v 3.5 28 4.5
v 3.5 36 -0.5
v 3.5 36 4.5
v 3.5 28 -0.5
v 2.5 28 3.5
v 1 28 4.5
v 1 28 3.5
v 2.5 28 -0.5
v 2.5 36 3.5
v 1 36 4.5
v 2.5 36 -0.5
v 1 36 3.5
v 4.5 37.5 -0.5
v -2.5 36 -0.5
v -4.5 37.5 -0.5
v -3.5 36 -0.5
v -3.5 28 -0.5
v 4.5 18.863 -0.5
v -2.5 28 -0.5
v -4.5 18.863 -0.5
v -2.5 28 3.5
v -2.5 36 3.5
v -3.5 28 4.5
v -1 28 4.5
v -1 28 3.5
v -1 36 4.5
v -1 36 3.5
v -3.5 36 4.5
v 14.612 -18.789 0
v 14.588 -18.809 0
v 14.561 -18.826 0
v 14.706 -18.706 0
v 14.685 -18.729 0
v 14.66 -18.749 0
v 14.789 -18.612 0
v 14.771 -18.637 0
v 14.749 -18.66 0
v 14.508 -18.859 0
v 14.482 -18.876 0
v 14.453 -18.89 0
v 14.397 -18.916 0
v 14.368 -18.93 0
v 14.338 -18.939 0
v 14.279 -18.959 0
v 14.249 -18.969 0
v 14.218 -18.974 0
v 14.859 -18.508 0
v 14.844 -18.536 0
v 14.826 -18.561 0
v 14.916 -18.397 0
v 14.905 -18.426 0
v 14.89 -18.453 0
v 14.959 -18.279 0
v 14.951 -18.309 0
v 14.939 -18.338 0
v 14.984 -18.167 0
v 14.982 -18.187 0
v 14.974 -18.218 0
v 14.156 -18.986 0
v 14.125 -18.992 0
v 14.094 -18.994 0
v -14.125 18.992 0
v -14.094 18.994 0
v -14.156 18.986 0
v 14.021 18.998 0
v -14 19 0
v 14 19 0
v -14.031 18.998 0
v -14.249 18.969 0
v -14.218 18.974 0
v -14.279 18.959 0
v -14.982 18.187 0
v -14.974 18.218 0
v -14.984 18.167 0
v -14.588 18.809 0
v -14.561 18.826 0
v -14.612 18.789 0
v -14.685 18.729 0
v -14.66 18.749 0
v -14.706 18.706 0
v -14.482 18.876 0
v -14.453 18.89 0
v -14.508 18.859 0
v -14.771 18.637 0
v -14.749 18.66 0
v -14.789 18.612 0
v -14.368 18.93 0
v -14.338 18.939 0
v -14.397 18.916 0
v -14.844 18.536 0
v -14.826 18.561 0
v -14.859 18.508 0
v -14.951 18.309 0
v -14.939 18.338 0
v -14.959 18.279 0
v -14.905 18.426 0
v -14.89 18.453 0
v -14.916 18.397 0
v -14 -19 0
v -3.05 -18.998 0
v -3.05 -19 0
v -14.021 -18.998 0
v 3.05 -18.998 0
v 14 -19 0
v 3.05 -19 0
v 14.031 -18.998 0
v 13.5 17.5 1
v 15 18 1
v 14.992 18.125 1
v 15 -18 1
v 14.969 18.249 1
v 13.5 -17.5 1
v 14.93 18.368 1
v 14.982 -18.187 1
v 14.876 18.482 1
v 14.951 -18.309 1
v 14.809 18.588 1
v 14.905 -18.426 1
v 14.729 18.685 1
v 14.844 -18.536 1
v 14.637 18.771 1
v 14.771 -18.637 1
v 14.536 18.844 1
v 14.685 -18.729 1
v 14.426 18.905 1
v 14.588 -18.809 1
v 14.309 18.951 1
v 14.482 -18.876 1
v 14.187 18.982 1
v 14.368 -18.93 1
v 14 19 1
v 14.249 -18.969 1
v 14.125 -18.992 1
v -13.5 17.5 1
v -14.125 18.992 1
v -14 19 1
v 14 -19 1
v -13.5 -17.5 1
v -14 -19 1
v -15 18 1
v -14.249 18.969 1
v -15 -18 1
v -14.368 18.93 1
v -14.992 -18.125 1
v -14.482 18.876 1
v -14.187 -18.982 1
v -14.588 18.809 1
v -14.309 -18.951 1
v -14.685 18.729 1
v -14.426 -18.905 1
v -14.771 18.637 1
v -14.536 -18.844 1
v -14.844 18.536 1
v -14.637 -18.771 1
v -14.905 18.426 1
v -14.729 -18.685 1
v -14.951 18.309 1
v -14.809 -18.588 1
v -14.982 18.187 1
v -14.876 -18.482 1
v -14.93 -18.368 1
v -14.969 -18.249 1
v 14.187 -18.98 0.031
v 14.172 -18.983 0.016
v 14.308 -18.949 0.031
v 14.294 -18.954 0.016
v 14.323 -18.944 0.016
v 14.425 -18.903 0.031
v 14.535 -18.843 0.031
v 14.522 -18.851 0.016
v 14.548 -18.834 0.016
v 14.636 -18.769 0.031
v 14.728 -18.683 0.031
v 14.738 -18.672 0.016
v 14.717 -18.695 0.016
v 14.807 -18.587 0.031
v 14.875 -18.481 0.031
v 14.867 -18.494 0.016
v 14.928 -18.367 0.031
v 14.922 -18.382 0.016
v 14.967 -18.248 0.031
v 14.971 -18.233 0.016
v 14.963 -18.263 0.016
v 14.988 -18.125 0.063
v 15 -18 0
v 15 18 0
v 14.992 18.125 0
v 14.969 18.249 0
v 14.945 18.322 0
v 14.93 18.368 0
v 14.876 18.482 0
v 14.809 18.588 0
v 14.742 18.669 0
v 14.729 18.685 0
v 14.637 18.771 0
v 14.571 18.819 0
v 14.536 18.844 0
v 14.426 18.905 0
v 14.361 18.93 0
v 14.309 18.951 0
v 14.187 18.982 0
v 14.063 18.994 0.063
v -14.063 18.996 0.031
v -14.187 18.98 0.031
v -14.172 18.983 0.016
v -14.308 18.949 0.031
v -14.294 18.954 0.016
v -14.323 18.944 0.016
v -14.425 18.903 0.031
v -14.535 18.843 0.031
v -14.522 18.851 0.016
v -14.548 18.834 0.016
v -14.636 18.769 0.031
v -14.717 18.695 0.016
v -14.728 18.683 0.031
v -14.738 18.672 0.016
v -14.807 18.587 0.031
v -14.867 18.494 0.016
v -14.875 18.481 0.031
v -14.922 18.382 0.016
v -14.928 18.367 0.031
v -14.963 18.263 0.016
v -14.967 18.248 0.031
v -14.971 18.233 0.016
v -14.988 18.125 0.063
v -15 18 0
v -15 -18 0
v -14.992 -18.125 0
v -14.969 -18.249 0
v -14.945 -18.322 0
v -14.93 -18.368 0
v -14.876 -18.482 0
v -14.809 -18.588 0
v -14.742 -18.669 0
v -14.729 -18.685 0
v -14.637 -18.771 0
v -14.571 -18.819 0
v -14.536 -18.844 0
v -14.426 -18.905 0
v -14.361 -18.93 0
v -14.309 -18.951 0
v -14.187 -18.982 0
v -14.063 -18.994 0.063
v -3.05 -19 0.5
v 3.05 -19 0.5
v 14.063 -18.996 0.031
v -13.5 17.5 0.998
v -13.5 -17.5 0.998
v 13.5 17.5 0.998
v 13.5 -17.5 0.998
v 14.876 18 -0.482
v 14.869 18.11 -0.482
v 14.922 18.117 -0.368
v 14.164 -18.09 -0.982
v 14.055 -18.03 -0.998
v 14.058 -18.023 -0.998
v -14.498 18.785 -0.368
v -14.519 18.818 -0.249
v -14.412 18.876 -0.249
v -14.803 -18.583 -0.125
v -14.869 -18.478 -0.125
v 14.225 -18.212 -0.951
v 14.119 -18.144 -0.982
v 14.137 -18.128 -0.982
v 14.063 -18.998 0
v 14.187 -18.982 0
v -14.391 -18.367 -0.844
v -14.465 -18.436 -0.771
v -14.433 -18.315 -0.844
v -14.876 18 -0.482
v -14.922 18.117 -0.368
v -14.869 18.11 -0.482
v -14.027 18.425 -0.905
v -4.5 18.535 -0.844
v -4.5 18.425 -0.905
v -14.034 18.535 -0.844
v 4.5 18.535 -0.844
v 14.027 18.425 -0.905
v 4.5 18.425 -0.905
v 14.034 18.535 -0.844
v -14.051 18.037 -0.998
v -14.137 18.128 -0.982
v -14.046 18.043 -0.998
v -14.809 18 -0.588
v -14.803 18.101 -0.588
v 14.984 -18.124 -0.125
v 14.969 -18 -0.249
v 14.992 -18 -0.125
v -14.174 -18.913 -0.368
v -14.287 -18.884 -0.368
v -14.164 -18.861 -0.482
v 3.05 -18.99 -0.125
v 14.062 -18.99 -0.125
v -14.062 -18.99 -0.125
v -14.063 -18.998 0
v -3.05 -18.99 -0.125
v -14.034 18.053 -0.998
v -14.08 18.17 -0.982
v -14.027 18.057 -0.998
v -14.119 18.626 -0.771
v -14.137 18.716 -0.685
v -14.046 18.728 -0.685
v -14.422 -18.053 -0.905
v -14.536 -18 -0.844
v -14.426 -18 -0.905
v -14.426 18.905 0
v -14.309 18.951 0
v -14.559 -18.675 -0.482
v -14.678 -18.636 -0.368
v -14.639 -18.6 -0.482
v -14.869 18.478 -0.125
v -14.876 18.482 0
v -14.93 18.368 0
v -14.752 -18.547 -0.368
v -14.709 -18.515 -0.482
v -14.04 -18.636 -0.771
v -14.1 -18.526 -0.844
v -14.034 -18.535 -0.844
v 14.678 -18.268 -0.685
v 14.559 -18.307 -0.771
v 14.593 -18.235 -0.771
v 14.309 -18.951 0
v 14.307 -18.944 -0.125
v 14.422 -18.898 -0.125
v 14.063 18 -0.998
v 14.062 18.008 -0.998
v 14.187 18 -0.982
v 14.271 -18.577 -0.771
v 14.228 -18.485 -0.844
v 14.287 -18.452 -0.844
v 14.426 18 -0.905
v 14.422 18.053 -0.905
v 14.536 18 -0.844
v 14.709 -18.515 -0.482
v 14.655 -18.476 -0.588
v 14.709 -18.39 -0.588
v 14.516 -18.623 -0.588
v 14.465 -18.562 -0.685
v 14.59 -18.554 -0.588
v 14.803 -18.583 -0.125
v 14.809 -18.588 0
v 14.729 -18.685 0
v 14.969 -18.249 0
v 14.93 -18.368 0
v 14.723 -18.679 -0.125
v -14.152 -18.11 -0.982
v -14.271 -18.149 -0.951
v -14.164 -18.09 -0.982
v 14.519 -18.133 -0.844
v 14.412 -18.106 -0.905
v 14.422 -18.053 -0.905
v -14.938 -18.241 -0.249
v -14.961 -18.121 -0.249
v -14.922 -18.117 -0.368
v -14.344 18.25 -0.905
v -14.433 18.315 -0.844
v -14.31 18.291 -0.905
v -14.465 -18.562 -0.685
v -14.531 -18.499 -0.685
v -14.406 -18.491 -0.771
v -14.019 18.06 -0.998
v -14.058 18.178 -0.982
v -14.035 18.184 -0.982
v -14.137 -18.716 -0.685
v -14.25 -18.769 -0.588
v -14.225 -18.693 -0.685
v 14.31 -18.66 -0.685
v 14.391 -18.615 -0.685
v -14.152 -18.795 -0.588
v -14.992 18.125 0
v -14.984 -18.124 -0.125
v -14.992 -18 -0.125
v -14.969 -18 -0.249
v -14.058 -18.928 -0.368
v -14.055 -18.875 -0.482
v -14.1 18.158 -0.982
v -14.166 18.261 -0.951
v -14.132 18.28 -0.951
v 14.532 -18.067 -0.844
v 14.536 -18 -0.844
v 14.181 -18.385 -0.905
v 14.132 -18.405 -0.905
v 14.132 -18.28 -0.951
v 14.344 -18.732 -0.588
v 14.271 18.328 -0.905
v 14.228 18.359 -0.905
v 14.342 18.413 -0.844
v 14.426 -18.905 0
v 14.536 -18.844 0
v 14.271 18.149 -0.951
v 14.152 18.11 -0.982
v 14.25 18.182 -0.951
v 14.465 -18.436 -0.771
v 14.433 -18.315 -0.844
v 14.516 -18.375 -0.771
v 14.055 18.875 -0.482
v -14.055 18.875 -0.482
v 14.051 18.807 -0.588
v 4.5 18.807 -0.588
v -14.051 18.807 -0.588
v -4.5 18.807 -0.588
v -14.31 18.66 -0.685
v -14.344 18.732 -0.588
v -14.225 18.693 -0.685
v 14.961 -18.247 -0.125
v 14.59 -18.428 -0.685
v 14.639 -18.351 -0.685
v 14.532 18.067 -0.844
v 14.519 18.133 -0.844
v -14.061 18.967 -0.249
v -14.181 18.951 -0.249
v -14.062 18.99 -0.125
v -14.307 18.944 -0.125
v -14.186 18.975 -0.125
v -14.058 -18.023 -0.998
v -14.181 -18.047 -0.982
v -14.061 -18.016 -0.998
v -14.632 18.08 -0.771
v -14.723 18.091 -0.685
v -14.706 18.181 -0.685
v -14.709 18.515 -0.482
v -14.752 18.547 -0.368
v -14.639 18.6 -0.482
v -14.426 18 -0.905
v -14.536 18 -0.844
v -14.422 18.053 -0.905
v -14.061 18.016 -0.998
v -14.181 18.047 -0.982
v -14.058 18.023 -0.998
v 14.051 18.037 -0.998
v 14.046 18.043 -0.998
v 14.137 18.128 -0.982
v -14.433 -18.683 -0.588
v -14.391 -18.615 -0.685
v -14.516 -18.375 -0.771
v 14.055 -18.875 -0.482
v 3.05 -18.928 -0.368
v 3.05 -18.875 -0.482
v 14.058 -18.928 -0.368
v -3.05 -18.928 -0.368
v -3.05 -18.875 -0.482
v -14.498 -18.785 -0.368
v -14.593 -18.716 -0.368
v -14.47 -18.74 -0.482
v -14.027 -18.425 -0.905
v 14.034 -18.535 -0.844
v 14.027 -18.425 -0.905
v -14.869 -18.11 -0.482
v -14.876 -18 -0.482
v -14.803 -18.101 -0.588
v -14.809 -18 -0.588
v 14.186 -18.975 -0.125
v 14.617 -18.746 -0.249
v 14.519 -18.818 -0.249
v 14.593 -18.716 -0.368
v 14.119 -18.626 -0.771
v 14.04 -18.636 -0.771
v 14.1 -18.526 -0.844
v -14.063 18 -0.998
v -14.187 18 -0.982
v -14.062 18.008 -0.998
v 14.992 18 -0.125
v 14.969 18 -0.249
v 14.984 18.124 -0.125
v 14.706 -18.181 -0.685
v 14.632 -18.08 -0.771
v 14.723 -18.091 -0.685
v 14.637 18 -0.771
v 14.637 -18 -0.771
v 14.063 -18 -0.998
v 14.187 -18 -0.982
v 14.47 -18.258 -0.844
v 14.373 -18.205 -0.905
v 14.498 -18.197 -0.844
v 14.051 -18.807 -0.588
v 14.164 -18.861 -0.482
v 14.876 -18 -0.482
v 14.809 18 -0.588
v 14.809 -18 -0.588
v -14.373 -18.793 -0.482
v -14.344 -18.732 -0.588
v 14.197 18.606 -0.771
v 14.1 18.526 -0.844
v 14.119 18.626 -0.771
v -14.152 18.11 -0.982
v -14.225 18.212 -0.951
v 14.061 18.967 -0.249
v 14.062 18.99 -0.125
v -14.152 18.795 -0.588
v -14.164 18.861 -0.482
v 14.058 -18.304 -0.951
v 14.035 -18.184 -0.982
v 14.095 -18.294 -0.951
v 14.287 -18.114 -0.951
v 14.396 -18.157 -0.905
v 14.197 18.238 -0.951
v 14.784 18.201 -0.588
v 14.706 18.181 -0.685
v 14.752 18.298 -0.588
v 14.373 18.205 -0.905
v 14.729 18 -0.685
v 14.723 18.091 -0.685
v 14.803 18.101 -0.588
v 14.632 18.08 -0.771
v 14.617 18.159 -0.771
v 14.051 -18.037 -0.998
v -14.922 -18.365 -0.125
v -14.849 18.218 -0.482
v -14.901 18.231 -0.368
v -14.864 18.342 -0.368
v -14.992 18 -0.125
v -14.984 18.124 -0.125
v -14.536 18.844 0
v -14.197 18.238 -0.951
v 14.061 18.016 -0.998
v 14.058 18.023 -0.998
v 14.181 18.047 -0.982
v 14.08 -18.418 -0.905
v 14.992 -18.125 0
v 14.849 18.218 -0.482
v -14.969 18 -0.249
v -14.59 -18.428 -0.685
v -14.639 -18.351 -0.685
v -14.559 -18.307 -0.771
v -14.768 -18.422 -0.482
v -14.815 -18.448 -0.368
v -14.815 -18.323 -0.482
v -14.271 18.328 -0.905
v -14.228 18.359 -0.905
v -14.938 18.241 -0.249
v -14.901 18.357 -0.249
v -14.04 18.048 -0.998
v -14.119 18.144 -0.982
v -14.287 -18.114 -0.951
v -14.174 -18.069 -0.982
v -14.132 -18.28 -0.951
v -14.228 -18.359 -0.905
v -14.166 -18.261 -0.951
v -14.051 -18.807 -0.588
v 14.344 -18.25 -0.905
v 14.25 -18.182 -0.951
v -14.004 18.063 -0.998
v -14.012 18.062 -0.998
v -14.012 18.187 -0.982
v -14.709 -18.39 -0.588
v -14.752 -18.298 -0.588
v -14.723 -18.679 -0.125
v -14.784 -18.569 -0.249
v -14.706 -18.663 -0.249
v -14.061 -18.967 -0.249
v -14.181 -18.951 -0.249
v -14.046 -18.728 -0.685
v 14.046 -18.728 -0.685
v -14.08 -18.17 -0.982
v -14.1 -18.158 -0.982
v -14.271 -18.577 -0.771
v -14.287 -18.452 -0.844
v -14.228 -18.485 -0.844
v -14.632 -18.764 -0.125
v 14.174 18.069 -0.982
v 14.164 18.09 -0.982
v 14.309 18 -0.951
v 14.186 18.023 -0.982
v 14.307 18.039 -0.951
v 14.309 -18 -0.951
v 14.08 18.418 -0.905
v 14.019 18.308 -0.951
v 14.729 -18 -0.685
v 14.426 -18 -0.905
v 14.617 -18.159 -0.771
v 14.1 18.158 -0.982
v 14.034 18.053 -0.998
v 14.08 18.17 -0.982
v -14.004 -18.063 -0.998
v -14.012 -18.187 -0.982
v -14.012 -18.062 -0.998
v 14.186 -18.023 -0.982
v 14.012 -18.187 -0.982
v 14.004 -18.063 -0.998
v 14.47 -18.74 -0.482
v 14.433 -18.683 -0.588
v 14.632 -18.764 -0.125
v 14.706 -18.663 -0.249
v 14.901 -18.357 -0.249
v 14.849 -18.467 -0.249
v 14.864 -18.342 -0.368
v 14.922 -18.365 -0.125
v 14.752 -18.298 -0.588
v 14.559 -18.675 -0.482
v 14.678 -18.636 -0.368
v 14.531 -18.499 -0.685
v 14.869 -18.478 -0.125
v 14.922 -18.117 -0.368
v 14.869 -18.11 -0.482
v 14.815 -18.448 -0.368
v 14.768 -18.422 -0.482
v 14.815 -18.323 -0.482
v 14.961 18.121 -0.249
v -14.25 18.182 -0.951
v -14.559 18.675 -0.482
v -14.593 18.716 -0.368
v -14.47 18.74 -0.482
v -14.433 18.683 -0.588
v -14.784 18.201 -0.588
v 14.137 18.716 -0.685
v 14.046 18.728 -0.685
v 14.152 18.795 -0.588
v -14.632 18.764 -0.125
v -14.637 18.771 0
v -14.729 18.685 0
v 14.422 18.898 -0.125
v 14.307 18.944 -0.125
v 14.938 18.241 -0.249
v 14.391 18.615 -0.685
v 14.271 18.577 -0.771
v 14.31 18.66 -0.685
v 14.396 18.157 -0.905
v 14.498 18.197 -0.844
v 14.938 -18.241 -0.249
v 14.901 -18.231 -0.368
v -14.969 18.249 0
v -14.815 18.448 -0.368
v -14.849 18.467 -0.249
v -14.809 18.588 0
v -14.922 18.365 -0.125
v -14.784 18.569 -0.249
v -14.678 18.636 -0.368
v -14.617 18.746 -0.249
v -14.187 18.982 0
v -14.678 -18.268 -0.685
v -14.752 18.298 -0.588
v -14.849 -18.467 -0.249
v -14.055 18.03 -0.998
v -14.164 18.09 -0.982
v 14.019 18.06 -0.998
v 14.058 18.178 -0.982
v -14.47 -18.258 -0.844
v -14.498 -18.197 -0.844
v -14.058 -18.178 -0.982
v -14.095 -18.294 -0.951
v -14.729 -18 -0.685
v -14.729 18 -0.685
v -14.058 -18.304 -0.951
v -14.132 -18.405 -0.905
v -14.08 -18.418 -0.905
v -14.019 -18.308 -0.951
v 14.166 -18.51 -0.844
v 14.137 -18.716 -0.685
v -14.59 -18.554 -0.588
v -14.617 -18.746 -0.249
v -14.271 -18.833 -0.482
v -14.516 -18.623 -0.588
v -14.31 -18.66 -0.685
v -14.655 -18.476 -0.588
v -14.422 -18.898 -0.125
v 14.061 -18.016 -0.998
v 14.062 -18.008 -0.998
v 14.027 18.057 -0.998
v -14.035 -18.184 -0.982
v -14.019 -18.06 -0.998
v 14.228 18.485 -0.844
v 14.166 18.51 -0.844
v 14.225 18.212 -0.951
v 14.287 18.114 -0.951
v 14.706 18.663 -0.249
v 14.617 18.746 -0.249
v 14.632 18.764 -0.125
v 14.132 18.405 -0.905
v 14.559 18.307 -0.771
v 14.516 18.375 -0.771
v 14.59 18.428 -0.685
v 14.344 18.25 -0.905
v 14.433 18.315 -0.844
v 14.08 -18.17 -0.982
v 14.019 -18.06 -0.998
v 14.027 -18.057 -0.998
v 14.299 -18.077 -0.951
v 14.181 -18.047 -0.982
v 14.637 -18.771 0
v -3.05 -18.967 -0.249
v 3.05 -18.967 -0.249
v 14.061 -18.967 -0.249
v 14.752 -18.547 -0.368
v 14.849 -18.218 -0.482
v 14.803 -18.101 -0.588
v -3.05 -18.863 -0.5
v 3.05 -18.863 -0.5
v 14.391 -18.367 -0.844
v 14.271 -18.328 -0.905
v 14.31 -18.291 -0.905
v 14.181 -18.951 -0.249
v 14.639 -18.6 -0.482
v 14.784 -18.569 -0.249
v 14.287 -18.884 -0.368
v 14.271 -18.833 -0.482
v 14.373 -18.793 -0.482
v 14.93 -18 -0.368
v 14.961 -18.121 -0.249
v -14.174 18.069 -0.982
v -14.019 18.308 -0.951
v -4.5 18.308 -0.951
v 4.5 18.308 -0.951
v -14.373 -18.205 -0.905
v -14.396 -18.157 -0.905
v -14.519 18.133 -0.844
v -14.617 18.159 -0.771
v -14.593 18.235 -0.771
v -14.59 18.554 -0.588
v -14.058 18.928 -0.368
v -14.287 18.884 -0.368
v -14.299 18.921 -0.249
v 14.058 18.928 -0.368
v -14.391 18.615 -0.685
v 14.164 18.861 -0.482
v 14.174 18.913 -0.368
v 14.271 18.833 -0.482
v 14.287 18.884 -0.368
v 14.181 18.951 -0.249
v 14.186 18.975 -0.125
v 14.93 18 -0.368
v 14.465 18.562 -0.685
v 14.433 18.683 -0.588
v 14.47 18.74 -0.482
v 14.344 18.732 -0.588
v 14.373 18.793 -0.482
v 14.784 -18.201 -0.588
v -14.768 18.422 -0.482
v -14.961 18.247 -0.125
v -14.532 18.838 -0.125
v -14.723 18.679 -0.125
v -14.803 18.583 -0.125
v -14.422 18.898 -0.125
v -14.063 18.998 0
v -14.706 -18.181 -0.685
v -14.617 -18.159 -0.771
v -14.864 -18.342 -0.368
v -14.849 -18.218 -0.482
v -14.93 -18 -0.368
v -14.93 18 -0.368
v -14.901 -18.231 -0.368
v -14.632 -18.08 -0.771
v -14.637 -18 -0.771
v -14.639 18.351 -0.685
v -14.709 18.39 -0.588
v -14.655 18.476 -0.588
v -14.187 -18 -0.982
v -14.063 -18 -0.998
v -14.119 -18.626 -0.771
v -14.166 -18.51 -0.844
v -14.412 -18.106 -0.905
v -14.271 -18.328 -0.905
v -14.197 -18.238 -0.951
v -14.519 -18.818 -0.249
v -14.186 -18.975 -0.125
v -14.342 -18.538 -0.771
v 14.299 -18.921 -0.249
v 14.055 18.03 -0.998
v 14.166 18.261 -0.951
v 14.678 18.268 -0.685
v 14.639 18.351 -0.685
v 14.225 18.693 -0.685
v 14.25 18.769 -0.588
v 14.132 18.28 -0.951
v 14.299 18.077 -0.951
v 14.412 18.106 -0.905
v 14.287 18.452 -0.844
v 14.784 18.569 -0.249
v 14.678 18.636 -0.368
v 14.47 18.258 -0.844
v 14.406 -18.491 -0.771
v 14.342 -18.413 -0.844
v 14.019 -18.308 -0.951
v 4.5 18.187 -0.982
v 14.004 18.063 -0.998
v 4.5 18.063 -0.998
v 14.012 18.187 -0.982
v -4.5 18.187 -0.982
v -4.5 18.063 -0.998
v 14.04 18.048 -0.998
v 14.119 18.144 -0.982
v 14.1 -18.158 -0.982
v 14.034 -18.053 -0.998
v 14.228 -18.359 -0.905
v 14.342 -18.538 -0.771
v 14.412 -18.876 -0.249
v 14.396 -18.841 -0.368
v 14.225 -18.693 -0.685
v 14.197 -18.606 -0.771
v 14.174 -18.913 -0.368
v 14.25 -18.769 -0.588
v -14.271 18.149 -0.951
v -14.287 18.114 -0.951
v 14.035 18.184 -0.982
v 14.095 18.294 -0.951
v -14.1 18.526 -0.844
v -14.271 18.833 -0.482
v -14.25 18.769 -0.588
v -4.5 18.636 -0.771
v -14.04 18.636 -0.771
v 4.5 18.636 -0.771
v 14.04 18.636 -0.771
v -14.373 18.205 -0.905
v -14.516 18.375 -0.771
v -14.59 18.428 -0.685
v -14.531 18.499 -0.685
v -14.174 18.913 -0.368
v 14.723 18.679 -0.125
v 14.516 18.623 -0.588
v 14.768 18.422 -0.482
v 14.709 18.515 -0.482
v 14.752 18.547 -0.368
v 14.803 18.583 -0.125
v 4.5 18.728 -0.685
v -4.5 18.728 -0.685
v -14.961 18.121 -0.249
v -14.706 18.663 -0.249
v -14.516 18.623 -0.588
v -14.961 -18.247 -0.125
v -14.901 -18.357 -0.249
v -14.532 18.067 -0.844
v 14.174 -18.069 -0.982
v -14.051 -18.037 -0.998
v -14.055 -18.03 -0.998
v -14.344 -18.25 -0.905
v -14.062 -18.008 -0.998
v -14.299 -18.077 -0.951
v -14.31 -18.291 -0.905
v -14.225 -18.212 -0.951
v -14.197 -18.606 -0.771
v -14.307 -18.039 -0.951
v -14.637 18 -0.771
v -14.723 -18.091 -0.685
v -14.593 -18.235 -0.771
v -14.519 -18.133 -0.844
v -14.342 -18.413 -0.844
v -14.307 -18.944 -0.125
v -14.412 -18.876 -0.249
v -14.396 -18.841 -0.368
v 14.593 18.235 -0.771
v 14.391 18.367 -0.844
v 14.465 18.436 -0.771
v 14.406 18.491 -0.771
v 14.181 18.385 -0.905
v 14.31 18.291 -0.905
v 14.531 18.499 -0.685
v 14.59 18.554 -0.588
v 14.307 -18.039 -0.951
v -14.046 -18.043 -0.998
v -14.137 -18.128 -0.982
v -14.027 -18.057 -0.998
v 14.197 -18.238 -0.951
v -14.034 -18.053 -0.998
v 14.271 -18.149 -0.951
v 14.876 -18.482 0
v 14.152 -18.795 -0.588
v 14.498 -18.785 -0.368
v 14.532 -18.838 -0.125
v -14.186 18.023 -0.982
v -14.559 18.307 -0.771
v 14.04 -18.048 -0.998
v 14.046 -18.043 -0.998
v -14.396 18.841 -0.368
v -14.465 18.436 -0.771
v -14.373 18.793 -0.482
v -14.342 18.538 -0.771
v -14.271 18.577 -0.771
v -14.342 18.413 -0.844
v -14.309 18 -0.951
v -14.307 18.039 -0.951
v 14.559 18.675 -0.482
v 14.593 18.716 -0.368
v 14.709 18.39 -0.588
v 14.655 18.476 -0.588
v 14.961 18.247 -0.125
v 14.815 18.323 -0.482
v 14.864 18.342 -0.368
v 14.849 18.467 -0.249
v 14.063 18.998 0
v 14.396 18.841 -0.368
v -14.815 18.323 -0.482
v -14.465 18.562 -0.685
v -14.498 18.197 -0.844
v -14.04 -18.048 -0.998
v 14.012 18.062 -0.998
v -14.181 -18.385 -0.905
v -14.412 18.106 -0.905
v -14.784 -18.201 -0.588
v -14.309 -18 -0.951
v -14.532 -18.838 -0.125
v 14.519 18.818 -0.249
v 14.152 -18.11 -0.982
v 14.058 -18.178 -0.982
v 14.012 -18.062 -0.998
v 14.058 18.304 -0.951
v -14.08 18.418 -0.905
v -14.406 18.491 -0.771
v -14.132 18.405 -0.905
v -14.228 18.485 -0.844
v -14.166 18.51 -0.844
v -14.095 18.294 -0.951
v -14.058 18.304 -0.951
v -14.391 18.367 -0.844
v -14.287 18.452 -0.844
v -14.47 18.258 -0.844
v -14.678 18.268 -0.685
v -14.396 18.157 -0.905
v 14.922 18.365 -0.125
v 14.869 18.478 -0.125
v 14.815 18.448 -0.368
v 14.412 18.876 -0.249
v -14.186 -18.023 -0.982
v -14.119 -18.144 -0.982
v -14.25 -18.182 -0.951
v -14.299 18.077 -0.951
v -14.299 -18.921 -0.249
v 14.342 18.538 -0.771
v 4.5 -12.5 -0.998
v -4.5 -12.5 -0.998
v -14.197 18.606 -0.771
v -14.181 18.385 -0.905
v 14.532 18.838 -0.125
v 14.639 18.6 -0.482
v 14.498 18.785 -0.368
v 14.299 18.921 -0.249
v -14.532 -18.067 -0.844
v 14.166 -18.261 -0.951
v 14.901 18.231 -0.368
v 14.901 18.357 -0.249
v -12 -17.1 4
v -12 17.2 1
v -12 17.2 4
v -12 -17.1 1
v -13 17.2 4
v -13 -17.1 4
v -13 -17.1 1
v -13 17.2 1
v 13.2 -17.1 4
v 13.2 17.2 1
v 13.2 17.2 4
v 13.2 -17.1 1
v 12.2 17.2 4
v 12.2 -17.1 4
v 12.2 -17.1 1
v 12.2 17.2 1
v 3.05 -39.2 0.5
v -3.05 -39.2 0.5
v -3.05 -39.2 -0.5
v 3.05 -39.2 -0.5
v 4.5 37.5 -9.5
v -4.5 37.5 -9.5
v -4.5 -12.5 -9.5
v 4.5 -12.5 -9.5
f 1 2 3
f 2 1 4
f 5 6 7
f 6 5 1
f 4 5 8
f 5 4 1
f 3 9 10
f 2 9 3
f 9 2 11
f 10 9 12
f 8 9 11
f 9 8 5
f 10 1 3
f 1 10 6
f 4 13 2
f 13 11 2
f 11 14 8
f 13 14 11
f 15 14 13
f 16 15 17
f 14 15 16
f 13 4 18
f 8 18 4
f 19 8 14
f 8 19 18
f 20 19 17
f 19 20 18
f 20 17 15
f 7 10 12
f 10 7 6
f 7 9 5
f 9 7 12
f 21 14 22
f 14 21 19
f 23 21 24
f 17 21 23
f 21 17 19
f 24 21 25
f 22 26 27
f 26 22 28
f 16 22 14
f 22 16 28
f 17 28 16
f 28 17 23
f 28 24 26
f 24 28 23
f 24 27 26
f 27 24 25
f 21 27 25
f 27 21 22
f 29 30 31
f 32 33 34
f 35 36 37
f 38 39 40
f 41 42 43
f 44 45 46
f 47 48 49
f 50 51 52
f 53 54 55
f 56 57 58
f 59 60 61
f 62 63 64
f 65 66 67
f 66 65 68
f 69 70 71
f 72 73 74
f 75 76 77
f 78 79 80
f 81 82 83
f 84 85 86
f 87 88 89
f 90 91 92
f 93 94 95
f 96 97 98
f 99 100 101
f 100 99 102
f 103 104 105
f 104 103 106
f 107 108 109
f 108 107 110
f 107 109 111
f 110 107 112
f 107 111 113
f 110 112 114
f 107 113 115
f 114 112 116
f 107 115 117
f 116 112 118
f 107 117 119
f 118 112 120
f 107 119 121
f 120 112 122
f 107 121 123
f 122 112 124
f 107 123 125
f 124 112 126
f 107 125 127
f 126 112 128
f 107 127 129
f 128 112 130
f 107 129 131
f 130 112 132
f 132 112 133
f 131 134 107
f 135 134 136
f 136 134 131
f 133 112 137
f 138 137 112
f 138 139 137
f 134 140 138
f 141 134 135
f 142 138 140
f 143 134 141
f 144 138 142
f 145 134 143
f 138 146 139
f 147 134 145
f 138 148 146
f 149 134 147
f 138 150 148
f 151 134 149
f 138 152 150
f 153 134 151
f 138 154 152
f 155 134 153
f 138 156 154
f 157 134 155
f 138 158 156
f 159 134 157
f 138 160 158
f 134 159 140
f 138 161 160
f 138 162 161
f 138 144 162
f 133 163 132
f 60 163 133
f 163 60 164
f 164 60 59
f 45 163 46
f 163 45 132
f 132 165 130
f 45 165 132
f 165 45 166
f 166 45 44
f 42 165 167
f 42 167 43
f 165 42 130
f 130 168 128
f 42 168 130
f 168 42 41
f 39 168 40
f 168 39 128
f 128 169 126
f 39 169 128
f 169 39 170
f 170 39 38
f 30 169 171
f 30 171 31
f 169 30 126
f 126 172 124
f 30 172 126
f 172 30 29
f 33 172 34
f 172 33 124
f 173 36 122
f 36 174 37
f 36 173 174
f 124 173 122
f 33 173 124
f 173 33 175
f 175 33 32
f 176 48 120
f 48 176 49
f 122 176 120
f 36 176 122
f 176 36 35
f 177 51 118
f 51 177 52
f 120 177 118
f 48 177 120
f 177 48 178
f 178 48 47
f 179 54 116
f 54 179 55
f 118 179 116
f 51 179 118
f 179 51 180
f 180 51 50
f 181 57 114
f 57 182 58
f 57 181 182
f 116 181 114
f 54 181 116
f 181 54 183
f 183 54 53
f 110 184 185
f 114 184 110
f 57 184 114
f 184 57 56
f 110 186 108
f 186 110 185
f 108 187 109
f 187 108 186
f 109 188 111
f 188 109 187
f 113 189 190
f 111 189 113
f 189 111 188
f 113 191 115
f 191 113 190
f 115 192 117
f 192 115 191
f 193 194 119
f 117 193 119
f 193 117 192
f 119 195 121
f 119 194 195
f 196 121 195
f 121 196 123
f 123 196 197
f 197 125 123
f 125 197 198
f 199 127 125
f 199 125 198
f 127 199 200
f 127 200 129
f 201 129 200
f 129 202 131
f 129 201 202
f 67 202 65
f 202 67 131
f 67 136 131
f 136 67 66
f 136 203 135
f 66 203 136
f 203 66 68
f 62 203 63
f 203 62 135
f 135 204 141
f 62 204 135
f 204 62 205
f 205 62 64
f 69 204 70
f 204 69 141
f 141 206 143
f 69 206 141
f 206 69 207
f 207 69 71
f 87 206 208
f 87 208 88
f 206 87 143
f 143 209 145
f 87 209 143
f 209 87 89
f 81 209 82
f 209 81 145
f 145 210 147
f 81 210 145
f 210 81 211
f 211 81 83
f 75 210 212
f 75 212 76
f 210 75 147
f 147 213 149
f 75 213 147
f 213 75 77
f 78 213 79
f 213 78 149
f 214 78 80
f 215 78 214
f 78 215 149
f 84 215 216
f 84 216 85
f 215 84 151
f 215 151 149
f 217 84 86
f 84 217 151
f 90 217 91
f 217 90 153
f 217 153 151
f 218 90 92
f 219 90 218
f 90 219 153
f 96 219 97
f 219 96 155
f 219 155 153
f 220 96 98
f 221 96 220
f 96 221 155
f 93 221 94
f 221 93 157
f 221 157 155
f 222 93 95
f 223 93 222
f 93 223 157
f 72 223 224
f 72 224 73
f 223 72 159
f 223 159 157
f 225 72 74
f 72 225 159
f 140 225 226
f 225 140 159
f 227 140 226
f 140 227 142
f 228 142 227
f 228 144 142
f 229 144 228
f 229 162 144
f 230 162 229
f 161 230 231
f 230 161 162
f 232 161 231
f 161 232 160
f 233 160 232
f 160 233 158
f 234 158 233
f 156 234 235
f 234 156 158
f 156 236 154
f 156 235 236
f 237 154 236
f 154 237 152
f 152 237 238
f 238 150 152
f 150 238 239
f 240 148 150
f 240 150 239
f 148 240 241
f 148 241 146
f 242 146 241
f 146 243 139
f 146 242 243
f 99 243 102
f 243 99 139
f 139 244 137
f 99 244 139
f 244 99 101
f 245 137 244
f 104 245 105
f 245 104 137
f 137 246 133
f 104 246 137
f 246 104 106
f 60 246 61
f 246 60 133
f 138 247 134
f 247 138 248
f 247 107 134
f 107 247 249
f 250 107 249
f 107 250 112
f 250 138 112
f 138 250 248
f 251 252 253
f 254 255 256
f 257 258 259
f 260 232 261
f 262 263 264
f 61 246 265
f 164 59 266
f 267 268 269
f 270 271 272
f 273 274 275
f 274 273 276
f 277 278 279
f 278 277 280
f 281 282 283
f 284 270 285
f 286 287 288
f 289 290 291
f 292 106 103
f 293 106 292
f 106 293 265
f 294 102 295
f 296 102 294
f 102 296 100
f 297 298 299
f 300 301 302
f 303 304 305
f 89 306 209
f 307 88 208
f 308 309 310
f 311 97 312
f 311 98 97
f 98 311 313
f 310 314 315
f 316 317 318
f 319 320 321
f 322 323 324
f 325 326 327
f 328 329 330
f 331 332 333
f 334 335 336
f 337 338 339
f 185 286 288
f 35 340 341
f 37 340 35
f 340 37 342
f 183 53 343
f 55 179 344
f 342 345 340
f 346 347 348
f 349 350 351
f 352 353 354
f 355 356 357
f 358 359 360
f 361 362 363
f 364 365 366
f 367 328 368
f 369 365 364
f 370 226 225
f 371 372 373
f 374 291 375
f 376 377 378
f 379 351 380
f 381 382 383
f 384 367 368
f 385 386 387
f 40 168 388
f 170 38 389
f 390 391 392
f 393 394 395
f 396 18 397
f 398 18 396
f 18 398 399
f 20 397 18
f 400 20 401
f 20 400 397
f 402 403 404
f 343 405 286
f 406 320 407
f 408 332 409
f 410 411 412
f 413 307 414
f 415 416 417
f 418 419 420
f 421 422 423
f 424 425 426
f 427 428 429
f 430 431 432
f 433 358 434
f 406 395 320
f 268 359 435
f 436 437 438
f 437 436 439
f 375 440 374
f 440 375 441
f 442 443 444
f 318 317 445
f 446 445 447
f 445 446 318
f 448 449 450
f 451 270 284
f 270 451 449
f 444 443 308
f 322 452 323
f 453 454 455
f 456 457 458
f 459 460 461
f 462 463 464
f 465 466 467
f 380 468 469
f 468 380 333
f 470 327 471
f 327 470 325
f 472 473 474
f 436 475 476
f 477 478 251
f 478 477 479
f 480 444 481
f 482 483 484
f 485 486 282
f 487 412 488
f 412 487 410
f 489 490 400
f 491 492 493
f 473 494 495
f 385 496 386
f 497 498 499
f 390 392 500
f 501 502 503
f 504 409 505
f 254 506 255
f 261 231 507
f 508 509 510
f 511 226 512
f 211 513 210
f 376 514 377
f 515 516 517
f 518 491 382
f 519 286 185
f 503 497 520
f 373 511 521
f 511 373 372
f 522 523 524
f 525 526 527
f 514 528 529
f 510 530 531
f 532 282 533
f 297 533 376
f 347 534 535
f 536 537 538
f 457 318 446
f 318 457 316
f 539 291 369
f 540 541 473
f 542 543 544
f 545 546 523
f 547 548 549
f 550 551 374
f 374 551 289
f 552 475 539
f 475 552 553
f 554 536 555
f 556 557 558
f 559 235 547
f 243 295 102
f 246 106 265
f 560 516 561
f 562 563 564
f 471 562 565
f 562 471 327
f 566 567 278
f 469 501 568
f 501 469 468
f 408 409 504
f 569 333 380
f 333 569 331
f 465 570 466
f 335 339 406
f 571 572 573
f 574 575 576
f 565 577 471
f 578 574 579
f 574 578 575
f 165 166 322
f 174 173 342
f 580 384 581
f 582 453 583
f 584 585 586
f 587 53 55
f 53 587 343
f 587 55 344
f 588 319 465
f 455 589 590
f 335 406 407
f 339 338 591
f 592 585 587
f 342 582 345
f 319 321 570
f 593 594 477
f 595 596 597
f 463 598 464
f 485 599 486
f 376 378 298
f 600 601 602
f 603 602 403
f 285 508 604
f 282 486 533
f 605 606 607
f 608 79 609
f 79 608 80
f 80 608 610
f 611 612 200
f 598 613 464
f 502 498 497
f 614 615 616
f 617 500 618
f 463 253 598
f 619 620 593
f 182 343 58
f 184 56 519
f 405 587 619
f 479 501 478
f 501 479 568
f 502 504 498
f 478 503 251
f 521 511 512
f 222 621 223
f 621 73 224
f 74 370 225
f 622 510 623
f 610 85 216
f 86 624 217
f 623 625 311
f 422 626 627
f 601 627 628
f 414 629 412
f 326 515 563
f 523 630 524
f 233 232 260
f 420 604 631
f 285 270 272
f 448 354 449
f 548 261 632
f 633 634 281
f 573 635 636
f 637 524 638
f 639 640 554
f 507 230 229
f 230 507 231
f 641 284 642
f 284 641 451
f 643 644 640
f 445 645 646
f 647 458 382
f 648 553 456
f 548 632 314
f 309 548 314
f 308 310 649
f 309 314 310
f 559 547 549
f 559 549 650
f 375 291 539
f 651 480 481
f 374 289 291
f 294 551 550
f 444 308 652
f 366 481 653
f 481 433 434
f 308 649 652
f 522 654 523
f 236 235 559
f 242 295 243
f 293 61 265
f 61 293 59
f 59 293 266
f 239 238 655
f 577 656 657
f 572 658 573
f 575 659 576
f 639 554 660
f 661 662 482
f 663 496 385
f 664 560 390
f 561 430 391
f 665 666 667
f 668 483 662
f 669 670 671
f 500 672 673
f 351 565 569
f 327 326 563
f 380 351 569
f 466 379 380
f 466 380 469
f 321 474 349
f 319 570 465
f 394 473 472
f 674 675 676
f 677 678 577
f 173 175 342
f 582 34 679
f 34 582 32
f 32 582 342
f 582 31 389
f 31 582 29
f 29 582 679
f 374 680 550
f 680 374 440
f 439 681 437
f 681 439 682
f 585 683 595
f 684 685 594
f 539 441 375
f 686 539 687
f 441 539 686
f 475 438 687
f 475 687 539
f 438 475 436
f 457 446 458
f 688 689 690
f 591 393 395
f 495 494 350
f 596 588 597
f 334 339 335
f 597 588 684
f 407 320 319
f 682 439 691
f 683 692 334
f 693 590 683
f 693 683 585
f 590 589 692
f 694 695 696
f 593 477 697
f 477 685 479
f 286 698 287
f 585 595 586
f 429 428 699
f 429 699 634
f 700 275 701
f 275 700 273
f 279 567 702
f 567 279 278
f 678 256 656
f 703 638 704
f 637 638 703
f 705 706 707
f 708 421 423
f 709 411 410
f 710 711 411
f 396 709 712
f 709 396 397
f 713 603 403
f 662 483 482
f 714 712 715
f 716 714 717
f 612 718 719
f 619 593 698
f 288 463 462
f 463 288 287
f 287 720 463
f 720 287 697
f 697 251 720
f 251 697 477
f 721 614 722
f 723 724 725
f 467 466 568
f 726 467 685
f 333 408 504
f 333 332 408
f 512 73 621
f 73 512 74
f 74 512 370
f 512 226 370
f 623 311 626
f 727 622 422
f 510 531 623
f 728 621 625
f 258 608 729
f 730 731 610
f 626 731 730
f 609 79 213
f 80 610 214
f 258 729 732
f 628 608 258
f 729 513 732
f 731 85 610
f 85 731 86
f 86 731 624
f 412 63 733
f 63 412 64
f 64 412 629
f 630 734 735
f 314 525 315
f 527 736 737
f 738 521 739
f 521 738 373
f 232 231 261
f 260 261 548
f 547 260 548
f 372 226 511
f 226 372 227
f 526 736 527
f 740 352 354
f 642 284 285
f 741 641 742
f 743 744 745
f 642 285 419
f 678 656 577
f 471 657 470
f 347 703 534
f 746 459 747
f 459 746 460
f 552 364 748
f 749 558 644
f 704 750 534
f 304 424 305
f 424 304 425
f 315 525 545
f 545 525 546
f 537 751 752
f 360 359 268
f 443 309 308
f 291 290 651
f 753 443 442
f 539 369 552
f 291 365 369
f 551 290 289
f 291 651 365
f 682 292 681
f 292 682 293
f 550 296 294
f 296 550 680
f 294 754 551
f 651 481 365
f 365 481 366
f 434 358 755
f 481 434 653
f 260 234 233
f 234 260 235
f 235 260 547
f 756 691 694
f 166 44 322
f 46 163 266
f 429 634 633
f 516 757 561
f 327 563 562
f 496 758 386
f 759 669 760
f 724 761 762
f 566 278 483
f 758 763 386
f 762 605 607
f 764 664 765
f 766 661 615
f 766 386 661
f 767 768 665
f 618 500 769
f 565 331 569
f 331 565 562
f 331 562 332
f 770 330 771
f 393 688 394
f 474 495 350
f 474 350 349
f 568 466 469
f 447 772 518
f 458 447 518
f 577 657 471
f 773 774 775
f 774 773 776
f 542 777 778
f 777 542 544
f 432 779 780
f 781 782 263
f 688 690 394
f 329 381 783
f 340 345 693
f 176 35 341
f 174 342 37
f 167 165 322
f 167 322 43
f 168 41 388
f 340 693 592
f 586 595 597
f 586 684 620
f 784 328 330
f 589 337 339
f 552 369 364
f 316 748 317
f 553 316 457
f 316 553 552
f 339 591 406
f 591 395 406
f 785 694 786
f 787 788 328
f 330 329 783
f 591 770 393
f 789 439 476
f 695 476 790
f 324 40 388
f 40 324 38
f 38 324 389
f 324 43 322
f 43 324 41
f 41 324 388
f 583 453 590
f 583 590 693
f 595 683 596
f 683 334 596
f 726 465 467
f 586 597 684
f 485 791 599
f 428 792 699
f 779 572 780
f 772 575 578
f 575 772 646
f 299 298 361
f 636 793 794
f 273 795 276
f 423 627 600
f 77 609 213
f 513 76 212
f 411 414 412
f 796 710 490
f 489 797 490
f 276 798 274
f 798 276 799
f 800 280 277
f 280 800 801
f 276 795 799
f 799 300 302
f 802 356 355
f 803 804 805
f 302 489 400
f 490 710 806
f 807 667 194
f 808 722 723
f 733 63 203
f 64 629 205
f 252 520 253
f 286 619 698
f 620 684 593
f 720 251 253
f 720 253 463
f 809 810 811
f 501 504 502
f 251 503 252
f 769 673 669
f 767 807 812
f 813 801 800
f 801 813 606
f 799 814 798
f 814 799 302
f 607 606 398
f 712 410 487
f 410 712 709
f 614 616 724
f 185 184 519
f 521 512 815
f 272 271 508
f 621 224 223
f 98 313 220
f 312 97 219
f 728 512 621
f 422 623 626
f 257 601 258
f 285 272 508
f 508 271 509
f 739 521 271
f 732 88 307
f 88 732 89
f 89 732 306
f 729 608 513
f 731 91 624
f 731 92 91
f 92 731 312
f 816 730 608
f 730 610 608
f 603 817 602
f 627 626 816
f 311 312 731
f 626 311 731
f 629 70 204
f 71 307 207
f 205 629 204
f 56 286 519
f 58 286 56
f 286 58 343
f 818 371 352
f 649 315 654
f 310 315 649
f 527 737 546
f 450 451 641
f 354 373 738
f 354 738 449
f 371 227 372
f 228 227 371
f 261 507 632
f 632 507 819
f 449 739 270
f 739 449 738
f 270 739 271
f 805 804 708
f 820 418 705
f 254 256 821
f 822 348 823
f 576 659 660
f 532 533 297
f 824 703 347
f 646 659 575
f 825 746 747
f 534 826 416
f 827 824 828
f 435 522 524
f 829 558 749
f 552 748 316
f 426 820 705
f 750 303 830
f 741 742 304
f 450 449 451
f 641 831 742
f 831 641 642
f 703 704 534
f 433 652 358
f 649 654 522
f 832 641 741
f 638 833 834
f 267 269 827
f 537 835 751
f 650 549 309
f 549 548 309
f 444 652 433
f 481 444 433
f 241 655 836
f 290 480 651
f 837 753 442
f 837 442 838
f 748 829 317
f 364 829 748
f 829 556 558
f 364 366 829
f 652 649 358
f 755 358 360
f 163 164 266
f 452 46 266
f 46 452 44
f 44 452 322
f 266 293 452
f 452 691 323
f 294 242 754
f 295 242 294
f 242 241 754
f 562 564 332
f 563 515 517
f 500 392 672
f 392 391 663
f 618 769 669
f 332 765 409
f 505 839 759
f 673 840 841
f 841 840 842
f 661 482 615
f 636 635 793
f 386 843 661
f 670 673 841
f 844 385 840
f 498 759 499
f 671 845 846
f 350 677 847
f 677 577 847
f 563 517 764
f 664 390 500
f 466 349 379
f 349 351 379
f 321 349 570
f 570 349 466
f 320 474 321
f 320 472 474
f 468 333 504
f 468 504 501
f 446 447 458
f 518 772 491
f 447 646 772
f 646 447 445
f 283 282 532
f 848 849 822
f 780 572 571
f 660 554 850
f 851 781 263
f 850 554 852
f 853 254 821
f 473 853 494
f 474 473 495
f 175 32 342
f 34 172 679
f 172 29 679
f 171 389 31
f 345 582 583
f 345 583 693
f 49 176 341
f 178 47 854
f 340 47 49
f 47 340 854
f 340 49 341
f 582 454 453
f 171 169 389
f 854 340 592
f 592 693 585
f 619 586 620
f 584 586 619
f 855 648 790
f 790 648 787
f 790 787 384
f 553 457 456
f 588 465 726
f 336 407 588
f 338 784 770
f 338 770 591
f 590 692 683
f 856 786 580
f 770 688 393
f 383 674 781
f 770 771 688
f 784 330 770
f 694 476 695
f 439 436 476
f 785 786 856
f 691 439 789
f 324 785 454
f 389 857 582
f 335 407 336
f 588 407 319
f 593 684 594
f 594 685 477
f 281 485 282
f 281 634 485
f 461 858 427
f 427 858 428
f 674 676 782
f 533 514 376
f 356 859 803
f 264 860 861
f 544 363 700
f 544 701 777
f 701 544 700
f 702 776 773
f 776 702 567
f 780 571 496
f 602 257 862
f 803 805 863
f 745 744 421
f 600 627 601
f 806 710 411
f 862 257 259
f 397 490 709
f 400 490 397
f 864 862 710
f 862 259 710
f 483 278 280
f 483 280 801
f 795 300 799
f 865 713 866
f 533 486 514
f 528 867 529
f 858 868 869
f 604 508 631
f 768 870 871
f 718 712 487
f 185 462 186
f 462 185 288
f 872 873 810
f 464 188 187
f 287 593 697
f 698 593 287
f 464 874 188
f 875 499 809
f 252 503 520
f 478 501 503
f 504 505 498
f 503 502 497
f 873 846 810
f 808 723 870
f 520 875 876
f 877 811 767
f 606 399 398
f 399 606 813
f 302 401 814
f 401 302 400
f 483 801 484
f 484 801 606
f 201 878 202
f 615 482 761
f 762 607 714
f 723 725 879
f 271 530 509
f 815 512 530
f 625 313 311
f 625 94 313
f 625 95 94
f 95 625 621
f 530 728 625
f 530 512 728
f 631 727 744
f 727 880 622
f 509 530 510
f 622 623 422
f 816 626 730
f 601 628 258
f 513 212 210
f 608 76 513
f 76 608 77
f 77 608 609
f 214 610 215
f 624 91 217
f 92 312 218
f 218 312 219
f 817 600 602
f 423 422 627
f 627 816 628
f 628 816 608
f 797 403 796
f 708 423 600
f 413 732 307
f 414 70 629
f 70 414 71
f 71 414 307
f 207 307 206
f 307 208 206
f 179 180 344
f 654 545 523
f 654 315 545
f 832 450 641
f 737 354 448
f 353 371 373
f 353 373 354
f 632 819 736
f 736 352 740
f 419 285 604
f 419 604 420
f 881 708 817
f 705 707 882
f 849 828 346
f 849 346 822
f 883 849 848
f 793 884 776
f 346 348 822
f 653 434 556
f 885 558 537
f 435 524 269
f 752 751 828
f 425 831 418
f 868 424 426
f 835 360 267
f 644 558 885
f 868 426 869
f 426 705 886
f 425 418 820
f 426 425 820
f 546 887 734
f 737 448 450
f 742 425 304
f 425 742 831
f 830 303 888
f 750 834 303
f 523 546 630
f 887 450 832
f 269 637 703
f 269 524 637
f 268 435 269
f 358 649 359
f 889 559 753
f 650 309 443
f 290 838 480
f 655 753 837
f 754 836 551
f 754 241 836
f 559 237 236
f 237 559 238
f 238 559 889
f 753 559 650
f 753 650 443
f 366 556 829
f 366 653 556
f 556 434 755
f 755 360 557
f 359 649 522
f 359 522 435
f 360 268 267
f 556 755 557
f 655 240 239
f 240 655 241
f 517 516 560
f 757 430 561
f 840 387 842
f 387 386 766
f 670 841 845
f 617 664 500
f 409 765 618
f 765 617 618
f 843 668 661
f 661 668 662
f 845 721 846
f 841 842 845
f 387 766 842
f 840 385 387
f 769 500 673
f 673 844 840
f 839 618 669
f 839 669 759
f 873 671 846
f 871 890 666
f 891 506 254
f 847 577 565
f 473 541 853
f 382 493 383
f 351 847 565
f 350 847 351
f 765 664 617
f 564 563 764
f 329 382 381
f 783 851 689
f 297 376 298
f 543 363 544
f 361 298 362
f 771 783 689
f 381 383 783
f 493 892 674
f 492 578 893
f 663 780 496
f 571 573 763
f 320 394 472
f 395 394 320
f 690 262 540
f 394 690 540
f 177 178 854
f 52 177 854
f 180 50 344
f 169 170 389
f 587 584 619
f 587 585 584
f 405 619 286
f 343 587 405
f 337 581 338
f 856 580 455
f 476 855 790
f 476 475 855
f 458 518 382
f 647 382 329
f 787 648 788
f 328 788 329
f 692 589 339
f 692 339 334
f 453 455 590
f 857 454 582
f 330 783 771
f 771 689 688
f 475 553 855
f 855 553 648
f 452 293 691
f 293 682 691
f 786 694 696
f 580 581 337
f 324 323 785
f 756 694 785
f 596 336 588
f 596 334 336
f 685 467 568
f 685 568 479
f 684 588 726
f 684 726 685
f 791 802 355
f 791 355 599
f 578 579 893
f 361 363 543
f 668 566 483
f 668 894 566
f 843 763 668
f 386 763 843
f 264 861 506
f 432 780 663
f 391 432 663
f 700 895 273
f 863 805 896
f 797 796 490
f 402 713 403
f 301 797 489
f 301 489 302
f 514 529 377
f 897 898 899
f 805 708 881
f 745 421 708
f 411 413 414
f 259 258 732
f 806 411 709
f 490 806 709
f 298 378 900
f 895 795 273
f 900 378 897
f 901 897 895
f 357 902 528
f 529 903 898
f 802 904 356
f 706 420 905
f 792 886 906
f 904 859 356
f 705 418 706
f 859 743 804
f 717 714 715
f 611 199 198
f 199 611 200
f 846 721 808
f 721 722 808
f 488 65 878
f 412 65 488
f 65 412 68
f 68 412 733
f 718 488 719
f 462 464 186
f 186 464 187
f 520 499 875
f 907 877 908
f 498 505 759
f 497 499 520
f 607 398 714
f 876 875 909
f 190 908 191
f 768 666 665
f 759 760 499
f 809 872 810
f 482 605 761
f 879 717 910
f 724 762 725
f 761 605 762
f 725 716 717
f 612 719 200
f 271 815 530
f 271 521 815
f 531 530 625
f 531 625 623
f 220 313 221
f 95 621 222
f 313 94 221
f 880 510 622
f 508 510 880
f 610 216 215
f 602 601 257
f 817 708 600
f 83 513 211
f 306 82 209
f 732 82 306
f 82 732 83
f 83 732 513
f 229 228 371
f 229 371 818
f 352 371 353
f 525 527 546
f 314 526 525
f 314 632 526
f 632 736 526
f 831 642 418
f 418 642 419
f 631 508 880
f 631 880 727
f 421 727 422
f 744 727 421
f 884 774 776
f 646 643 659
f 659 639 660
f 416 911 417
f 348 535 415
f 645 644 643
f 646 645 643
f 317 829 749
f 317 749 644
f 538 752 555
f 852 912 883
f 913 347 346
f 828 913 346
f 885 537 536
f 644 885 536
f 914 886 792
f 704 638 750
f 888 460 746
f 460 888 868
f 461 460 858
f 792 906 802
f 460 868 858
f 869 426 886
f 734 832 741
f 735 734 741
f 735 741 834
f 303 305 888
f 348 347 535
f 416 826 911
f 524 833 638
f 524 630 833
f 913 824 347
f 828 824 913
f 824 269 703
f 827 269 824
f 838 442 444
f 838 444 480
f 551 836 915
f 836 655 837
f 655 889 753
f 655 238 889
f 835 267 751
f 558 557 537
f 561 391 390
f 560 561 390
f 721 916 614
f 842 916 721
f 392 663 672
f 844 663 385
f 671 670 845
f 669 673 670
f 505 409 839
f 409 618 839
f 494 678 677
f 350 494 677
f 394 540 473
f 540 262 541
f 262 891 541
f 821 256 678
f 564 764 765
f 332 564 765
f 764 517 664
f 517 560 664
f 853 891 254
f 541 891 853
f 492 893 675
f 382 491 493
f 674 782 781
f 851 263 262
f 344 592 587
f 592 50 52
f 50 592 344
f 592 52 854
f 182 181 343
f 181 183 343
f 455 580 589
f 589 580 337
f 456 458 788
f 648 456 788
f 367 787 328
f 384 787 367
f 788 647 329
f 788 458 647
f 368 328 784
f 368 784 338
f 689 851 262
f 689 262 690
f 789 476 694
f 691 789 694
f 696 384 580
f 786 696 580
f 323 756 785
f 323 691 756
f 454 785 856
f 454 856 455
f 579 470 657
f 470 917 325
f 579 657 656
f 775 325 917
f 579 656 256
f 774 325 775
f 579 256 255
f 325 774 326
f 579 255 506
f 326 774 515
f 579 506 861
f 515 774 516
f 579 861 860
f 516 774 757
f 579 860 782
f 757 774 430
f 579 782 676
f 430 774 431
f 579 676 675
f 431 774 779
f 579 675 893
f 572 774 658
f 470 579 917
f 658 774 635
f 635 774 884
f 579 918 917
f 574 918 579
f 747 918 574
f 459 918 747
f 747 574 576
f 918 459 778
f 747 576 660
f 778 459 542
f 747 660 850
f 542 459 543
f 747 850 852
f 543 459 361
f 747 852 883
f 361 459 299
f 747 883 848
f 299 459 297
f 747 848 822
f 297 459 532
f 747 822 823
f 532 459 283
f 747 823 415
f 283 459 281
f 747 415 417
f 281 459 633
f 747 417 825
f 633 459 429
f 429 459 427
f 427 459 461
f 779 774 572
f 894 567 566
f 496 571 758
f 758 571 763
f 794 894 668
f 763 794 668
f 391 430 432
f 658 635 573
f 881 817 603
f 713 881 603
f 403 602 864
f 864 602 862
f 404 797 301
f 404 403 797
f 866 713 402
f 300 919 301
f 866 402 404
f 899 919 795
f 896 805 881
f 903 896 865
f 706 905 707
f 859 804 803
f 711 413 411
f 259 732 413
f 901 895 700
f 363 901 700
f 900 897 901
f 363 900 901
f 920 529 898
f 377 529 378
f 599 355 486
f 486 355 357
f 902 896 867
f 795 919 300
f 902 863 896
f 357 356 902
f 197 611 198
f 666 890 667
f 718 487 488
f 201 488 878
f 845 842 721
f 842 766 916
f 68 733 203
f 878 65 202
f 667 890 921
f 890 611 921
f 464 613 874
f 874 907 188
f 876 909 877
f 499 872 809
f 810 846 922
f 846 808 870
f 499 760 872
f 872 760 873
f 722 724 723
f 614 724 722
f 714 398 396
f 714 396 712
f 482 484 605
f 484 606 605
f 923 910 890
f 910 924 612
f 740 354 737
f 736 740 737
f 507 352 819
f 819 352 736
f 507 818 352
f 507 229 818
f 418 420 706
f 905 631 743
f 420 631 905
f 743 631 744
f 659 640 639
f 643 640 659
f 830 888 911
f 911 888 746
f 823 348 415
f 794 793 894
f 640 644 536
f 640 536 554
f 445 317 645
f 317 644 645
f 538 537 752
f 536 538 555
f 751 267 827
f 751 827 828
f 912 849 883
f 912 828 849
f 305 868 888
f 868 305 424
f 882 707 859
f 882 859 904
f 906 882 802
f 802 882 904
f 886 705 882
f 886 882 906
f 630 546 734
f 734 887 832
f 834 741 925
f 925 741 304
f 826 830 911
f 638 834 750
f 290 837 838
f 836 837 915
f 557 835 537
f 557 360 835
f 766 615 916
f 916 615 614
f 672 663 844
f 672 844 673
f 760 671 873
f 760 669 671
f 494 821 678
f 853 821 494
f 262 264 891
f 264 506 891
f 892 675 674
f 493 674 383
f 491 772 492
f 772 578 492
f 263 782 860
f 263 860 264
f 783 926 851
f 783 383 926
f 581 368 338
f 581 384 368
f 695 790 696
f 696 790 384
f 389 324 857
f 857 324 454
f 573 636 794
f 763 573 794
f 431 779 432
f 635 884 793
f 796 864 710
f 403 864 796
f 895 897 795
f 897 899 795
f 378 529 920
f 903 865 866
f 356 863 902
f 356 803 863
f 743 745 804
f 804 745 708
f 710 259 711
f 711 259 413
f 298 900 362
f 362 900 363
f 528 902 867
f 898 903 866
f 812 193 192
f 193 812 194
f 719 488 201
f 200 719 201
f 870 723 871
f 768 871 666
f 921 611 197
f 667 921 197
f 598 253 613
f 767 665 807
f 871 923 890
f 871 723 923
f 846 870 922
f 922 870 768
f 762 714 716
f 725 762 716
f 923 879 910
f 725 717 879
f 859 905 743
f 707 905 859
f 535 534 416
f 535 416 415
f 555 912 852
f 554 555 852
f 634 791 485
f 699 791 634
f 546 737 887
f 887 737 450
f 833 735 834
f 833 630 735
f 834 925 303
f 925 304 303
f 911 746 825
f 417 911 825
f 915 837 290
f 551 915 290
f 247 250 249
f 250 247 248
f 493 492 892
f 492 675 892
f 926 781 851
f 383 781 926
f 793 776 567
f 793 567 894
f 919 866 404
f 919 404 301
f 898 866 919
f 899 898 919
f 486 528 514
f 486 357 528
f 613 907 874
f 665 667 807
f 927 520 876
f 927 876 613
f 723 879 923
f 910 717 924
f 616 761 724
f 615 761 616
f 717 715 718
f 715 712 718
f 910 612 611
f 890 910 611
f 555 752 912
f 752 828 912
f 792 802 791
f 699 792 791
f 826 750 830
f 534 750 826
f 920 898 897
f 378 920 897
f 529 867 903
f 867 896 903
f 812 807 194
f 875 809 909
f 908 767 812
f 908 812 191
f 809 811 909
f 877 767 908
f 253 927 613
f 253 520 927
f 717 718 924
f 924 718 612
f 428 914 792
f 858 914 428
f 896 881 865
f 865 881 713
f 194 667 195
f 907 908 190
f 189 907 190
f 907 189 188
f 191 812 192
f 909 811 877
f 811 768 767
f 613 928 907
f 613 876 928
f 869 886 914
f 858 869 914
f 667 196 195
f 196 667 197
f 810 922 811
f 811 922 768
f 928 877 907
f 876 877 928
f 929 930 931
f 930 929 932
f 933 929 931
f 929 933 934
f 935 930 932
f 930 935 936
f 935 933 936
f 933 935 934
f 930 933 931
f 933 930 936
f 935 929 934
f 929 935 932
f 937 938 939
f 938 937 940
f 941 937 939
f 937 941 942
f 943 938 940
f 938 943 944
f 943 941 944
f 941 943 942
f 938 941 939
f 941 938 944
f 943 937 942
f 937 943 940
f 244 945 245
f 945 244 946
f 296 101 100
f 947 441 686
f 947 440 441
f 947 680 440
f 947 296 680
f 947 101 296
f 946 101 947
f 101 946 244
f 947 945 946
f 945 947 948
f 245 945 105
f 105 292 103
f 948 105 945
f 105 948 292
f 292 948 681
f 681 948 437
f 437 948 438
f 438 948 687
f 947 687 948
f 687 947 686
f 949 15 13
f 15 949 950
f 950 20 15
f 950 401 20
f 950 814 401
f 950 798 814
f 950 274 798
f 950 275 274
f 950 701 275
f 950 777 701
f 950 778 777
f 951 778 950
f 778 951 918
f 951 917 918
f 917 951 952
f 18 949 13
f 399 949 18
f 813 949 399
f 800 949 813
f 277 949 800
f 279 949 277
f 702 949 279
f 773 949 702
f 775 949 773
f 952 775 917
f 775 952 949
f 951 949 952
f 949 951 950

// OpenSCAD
$fn=50;
BOX_W = 28; // Box Width
BOX_L = 36;// Box Length
BOX_H = 1.0; // Box Height
//SCREW_SIZE = .5; // Screw size in mm
CORNER_RADIUS = 1.0; // Radius of corners
WALL = 1.0;// Wall Thickness

KEEL_WIDTH=9.0;
KEEL_HEIGHT=9.0;
KEEL_LENGTH=50;

difference() {
  union() {
    linear_extrude( BOX_H )
    difference(){
      offset(r=CORNER_RADIUS) square( [BOX_W, BOX_L], center=true );
      offset( r= CORNER_RADIUS - WALL ) square( [BOX_W-WALL, BOX_L-WALL],  center=true );
    };

    coordinates = [ [0,0],[0,BOX_L],[BOX_W,BOX_L],[BOX_W,0] ];

    translate ( [-BOX_W/2, -BOX_L/2] )
    hull()
    for (i = coordinates)
      translate(i) sphere(CORNER_RADIUS);

    translate([BOX_W/-2+WALL,BOX_L/-2+0.9,WALL]) cube([WALL,BOX_L-(WALL*2)+0.3,3]);

    translate([BOX_W/2-WALL*1.8,BOX_L/-2+0.9,WALL]) cube([WALL,BOX_L-(WALL*2)+0.3,3]);

    // mic channel cover
    translate([0,-17,WALL-1])
    rotate([90,0,0])
    #linear_extrude(22.2) square([6.1,1.0], center=true);
    
    // keel
    translate([0,37.5,-5])
    rotate([90,0,0])
    #linear_extrude(KEEL_LENGTH) square([KEEL_WIDTH, KEEL_HEIGHT], center=true); 

    // Inverted L-shaped C-clamp
    difference() {
      translate([KEEL_WIDTH/2-2, KEEL_LENGTH-18, -0.5])
      rotate([90, 0, 0])
      union() {
        // Vertical arm of the C-clamp 2
        translate([0, 0, -4]) cube([1, 5, 8]);
        // Horizontal arm of the C-clamp
        rotate([90, 0, 0])
        translate([-1.5, -4, -5]) cube([1.5, 8, 1]);
          
        // Vertical arm of the C-clamp 1
        translate([-6, 0, -4]) cube([1, 5, 8]);
        // Horizontal arm of the C-clamp
        rotate([90, 0, 0])
        translate([-5, -4,-5]) cube([1.5, 8, 1]);


        // Horizontal arm of the C-clamp
        //rotate([90, 0, 0])
        //translate([-5, 0, -5]) cube([5, 5, 1]);
      }
      // Cable hole
      //translate([0, 0, -1]) cylinder(h=4, r=0.8, center=true);
    }
  }
}
